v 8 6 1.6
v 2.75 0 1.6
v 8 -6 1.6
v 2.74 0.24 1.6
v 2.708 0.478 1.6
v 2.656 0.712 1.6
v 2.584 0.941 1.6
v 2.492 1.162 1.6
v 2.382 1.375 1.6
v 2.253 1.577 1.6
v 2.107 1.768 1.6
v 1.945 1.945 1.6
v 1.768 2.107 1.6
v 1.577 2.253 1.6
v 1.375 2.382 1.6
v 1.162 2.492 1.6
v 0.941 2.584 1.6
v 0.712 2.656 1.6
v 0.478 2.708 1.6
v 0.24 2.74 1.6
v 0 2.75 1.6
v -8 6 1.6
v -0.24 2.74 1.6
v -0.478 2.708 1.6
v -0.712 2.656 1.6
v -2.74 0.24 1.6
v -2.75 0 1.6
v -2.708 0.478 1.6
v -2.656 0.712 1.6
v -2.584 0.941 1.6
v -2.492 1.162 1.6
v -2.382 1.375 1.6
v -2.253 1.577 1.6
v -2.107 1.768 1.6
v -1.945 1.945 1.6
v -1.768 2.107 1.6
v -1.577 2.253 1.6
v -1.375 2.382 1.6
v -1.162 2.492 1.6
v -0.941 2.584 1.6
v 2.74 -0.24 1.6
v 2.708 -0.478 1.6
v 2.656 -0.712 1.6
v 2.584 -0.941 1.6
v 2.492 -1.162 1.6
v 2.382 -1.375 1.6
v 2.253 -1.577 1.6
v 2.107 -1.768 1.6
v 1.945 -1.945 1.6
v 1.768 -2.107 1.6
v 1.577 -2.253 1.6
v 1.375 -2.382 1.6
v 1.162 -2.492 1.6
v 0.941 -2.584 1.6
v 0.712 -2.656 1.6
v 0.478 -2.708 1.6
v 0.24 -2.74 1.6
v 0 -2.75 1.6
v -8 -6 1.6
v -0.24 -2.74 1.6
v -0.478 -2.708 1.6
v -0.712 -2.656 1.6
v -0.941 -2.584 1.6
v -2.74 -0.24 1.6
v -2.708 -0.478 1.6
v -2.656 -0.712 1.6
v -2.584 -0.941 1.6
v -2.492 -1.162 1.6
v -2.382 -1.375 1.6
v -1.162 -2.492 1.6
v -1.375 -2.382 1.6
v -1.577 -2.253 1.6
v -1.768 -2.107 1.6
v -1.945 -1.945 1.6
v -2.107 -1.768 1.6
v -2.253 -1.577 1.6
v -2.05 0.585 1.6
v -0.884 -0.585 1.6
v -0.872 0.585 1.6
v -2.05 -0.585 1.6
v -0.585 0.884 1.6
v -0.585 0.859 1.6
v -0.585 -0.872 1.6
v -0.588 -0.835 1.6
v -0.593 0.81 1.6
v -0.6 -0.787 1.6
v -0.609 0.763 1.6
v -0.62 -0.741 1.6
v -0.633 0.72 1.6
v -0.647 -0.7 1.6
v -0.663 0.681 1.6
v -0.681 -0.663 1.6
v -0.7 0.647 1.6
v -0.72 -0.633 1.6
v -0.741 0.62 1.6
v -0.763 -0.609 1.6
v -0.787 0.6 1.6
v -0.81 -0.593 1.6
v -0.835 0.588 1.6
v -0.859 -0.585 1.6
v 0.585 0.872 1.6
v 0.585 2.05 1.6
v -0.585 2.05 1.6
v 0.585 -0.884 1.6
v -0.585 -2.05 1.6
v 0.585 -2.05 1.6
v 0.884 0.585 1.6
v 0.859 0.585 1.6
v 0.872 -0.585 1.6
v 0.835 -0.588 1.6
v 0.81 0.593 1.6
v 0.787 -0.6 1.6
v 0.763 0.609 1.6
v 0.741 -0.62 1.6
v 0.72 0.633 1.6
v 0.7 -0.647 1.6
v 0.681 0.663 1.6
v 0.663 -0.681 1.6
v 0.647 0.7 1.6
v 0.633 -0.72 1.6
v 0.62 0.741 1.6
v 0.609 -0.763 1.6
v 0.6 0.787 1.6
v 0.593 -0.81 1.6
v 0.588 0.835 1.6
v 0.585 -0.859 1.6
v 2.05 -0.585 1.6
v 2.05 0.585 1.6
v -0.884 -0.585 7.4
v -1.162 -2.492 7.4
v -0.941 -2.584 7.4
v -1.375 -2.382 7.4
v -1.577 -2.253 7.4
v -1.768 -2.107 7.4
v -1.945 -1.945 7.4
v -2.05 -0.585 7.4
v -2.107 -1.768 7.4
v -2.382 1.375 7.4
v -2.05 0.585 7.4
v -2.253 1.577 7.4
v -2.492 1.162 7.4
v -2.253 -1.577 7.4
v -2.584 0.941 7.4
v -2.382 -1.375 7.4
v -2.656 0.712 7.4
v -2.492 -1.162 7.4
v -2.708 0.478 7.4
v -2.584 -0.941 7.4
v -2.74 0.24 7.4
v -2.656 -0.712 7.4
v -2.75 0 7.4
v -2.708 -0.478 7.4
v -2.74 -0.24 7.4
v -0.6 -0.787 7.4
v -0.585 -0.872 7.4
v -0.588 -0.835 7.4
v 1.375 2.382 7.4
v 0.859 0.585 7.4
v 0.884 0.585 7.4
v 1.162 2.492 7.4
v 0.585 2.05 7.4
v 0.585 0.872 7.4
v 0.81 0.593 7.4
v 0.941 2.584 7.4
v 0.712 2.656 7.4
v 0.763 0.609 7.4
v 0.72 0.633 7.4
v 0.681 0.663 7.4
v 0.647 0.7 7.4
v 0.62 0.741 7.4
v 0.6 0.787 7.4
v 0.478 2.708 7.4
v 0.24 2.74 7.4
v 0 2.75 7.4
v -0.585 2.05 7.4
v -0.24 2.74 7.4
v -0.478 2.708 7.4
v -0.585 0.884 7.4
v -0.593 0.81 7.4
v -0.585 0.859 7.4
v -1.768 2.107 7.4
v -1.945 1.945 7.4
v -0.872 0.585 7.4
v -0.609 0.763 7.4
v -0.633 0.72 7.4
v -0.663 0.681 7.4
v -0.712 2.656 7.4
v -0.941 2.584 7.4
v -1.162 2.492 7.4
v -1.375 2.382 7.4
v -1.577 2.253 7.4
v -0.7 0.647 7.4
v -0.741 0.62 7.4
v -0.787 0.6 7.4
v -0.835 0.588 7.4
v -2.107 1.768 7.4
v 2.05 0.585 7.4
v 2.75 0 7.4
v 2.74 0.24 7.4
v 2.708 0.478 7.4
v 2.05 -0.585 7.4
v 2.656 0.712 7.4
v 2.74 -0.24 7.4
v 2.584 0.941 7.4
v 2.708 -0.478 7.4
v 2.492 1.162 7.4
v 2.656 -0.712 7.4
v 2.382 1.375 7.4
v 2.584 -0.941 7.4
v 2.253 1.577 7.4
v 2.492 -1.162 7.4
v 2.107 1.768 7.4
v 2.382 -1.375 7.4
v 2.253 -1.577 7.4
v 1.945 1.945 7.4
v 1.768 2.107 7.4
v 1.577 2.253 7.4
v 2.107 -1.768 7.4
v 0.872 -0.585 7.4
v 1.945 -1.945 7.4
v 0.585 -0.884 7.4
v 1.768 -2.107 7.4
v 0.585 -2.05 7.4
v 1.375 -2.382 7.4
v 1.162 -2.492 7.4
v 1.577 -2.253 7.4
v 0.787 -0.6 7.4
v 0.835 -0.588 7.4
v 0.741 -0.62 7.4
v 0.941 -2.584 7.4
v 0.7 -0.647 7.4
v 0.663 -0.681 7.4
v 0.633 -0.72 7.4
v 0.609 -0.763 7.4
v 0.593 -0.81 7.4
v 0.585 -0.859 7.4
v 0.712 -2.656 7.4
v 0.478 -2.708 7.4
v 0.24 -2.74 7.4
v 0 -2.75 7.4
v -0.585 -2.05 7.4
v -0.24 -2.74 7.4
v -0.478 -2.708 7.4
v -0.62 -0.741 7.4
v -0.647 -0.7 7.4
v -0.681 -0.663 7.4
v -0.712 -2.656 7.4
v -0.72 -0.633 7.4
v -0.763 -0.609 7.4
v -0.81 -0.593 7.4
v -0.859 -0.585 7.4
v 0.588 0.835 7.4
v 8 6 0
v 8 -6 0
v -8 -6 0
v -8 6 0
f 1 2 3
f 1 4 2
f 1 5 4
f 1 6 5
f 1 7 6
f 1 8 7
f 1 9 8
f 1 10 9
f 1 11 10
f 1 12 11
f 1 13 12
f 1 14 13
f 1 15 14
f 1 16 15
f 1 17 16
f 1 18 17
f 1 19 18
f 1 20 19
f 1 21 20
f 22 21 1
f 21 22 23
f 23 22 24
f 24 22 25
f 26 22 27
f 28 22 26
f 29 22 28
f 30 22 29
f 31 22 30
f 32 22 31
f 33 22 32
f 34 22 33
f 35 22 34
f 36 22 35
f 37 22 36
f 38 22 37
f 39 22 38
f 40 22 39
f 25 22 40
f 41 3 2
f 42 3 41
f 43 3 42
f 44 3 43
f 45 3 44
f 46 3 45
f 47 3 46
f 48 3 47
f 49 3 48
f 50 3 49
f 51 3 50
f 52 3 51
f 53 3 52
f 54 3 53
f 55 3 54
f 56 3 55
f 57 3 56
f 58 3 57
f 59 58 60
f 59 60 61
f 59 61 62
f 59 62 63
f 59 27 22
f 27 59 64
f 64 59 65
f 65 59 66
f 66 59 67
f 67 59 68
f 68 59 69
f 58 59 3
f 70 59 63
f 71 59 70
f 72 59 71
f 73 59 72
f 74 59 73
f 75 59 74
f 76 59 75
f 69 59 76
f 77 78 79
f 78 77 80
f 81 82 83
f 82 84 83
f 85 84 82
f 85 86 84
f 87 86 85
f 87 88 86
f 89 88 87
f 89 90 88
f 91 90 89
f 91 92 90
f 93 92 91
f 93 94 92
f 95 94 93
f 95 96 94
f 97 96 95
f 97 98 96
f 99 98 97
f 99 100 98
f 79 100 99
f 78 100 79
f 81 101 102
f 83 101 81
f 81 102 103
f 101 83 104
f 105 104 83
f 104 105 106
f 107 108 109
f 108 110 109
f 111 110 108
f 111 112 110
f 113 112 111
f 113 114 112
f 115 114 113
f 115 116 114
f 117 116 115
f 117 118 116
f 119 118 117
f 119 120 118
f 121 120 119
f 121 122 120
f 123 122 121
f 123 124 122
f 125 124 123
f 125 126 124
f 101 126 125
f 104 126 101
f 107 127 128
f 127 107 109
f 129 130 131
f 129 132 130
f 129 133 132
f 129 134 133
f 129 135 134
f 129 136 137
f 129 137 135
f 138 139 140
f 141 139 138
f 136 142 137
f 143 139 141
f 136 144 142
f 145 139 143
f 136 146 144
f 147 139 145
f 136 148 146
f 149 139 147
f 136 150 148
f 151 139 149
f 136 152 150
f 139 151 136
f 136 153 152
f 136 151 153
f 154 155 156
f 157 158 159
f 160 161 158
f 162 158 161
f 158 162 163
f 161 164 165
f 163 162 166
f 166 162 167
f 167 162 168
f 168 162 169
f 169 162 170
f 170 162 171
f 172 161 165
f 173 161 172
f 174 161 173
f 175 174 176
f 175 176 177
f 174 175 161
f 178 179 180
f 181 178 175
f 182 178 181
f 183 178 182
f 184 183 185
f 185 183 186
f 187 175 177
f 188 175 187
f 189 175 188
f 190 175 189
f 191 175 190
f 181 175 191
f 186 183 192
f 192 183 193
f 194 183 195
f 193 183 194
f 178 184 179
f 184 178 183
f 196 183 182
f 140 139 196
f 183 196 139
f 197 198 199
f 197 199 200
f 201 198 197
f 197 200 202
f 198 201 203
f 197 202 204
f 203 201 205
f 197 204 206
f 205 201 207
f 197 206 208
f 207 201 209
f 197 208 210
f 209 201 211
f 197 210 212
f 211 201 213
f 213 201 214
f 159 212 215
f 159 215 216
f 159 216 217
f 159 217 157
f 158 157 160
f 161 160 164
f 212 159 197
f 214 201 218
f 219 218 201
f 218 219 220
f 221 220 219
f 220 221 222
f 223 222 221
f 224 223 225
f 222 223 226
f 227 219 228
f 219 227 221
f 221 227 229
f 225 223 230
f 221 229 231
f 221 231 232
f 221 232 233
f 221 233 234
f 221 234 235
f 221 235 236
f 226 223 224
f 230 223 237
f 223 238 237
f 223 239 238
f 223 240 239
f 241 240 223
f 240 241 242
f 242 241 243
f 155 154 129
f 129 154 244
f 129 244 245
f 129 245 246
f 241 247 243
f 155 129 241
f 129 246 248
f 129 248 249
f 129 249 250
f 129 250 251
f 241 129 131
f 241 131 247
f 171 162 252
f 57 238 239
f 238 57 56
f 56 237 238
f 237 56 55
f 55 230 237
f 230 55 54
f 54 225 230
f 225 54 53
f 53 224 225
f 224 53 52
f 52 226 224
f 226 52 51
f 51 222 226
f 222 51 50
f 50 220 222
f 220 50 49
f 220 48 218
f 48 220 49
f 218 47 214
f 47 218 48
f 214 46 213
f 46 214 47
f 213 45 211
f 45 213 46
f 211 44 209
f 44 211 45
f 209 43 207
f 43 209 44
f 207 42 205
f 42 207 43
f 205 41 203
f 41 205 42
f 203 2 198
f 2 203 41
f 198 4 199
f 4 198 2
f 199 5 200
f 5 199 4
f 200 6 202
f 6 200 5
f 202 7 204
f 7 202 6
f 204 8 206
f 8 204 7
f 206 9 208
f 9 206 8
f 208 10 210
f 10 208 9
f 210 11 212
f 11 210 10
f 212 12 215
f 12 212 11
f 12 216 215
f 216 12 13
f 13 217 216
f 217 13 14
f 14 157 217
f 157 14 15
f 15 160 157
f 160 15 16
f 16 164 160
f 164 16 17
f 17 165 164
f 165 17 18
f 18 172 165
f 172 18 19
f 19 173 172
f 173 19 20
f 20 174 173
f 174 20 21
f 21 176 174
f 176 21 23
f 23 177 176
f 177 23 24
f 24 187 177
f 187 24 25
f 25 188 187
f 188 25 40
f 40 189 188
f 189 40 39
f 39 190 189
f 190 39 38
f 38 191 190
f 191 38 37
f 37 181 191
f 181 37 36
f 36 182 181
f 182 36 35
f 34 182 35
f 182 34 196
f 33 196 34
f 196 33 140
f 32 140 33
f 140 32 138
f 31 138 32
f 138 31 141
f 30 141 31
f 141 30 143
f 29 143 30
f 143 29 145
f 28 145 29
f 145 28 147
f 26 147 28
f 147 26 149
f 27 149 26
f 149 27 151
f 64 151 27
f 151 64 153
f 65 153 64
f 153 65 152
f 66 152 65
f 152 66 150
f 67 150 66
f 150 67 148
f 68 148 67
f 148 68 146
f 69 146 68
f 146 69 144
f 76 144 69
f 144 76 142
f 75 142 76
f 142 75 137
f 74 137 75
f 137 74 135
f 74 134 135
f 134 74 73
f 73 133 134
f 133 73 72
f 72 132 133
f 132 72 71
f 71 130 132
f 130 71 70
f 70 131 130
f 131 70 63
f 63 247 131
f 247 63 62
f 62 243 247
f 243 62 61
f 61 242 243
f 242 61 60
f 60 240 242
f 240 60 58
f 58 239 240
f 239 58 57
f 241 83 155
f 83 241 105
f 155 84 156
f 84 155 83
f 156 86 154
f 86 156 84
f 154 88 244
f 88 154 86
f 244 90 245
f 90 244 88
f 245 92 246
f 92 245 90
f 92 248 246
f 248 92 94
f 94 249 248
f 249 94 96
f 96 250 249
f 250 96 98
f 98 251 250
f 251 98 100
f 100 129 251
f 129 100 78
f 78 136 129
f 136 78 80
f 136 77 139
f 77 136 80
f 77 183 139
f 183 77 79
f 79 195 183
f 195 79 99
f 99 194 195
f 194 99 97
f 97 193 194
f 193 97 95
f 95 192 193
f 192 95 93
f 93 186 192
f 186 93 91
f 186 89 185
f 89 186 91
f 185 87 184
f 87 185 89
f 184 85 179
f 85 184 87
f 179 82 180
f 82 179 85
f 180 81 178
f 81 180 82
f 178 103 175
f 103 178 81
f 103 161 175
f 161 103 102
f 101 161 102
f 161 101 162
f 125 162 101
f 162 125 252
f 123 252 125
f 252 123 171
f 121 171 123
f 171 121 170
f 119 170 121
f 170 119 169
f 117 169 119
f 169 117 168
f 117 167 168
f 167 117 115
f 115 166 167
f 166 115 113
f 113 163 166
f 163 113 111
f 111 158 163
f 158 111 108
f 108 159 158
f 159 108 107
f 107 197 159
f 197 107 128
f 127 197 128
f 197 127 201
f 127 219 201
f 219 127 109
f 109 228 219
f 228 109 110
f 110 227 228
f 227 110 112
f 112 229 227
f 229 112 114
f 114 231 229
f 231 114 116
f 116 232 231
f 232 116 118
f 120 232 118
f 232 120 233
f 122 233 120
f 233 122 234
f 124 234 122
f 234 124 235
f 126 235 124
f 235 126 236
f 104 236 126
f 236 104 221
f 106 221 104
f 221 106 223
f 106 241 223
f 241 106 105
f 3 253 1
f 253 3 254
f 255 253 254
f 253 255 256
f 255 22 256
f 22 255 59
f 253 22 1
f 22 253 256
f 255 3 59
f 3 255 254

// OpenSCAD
$fs=0.05;
$fa=5; 


main();
module main() {
    height=5.8;
    thickness=1.6;
    translate([0,0,thickness]) {
        key_stem(height=height);
    }
    face(thickness=thickness);
}

module face(thickness=1.6,width=16,height=12) {
    translate([0,0,thickness/2])
    cube([width,height,thickness],center=true);
}

module key_stem(height=5.8) {
    linear_extrude(height=height,center=false) {
        difference() {
            circle(d=5.5);
            square([4.1,1.17],center=true);
            square([1.17,4.1],center=true);
            rotate(a=0,v=[0,0,1]){
                translate([-0.884,-0.884]) {
                    radius(0.3);
                }
            }
            rotate(a=90,v=[0,0,1]){
                translate([-0.884,-0.884]) {
                    radius(0.3);
                }
            }
            rotate(a=180,v=[0,0,1]){
                translate([-0.884,-0.884]) {
                    radius(0.3);
                }
            }
            rotate(a=270,v=[0,0,1]){
                translate([-0.884,-0.884]) {
                    radius(0.3);
                }
            }
        }
    }
}

module radius(r) {
    difference() {
        square([r,r],center=false);
        circle(d=r*2);
    }
}
